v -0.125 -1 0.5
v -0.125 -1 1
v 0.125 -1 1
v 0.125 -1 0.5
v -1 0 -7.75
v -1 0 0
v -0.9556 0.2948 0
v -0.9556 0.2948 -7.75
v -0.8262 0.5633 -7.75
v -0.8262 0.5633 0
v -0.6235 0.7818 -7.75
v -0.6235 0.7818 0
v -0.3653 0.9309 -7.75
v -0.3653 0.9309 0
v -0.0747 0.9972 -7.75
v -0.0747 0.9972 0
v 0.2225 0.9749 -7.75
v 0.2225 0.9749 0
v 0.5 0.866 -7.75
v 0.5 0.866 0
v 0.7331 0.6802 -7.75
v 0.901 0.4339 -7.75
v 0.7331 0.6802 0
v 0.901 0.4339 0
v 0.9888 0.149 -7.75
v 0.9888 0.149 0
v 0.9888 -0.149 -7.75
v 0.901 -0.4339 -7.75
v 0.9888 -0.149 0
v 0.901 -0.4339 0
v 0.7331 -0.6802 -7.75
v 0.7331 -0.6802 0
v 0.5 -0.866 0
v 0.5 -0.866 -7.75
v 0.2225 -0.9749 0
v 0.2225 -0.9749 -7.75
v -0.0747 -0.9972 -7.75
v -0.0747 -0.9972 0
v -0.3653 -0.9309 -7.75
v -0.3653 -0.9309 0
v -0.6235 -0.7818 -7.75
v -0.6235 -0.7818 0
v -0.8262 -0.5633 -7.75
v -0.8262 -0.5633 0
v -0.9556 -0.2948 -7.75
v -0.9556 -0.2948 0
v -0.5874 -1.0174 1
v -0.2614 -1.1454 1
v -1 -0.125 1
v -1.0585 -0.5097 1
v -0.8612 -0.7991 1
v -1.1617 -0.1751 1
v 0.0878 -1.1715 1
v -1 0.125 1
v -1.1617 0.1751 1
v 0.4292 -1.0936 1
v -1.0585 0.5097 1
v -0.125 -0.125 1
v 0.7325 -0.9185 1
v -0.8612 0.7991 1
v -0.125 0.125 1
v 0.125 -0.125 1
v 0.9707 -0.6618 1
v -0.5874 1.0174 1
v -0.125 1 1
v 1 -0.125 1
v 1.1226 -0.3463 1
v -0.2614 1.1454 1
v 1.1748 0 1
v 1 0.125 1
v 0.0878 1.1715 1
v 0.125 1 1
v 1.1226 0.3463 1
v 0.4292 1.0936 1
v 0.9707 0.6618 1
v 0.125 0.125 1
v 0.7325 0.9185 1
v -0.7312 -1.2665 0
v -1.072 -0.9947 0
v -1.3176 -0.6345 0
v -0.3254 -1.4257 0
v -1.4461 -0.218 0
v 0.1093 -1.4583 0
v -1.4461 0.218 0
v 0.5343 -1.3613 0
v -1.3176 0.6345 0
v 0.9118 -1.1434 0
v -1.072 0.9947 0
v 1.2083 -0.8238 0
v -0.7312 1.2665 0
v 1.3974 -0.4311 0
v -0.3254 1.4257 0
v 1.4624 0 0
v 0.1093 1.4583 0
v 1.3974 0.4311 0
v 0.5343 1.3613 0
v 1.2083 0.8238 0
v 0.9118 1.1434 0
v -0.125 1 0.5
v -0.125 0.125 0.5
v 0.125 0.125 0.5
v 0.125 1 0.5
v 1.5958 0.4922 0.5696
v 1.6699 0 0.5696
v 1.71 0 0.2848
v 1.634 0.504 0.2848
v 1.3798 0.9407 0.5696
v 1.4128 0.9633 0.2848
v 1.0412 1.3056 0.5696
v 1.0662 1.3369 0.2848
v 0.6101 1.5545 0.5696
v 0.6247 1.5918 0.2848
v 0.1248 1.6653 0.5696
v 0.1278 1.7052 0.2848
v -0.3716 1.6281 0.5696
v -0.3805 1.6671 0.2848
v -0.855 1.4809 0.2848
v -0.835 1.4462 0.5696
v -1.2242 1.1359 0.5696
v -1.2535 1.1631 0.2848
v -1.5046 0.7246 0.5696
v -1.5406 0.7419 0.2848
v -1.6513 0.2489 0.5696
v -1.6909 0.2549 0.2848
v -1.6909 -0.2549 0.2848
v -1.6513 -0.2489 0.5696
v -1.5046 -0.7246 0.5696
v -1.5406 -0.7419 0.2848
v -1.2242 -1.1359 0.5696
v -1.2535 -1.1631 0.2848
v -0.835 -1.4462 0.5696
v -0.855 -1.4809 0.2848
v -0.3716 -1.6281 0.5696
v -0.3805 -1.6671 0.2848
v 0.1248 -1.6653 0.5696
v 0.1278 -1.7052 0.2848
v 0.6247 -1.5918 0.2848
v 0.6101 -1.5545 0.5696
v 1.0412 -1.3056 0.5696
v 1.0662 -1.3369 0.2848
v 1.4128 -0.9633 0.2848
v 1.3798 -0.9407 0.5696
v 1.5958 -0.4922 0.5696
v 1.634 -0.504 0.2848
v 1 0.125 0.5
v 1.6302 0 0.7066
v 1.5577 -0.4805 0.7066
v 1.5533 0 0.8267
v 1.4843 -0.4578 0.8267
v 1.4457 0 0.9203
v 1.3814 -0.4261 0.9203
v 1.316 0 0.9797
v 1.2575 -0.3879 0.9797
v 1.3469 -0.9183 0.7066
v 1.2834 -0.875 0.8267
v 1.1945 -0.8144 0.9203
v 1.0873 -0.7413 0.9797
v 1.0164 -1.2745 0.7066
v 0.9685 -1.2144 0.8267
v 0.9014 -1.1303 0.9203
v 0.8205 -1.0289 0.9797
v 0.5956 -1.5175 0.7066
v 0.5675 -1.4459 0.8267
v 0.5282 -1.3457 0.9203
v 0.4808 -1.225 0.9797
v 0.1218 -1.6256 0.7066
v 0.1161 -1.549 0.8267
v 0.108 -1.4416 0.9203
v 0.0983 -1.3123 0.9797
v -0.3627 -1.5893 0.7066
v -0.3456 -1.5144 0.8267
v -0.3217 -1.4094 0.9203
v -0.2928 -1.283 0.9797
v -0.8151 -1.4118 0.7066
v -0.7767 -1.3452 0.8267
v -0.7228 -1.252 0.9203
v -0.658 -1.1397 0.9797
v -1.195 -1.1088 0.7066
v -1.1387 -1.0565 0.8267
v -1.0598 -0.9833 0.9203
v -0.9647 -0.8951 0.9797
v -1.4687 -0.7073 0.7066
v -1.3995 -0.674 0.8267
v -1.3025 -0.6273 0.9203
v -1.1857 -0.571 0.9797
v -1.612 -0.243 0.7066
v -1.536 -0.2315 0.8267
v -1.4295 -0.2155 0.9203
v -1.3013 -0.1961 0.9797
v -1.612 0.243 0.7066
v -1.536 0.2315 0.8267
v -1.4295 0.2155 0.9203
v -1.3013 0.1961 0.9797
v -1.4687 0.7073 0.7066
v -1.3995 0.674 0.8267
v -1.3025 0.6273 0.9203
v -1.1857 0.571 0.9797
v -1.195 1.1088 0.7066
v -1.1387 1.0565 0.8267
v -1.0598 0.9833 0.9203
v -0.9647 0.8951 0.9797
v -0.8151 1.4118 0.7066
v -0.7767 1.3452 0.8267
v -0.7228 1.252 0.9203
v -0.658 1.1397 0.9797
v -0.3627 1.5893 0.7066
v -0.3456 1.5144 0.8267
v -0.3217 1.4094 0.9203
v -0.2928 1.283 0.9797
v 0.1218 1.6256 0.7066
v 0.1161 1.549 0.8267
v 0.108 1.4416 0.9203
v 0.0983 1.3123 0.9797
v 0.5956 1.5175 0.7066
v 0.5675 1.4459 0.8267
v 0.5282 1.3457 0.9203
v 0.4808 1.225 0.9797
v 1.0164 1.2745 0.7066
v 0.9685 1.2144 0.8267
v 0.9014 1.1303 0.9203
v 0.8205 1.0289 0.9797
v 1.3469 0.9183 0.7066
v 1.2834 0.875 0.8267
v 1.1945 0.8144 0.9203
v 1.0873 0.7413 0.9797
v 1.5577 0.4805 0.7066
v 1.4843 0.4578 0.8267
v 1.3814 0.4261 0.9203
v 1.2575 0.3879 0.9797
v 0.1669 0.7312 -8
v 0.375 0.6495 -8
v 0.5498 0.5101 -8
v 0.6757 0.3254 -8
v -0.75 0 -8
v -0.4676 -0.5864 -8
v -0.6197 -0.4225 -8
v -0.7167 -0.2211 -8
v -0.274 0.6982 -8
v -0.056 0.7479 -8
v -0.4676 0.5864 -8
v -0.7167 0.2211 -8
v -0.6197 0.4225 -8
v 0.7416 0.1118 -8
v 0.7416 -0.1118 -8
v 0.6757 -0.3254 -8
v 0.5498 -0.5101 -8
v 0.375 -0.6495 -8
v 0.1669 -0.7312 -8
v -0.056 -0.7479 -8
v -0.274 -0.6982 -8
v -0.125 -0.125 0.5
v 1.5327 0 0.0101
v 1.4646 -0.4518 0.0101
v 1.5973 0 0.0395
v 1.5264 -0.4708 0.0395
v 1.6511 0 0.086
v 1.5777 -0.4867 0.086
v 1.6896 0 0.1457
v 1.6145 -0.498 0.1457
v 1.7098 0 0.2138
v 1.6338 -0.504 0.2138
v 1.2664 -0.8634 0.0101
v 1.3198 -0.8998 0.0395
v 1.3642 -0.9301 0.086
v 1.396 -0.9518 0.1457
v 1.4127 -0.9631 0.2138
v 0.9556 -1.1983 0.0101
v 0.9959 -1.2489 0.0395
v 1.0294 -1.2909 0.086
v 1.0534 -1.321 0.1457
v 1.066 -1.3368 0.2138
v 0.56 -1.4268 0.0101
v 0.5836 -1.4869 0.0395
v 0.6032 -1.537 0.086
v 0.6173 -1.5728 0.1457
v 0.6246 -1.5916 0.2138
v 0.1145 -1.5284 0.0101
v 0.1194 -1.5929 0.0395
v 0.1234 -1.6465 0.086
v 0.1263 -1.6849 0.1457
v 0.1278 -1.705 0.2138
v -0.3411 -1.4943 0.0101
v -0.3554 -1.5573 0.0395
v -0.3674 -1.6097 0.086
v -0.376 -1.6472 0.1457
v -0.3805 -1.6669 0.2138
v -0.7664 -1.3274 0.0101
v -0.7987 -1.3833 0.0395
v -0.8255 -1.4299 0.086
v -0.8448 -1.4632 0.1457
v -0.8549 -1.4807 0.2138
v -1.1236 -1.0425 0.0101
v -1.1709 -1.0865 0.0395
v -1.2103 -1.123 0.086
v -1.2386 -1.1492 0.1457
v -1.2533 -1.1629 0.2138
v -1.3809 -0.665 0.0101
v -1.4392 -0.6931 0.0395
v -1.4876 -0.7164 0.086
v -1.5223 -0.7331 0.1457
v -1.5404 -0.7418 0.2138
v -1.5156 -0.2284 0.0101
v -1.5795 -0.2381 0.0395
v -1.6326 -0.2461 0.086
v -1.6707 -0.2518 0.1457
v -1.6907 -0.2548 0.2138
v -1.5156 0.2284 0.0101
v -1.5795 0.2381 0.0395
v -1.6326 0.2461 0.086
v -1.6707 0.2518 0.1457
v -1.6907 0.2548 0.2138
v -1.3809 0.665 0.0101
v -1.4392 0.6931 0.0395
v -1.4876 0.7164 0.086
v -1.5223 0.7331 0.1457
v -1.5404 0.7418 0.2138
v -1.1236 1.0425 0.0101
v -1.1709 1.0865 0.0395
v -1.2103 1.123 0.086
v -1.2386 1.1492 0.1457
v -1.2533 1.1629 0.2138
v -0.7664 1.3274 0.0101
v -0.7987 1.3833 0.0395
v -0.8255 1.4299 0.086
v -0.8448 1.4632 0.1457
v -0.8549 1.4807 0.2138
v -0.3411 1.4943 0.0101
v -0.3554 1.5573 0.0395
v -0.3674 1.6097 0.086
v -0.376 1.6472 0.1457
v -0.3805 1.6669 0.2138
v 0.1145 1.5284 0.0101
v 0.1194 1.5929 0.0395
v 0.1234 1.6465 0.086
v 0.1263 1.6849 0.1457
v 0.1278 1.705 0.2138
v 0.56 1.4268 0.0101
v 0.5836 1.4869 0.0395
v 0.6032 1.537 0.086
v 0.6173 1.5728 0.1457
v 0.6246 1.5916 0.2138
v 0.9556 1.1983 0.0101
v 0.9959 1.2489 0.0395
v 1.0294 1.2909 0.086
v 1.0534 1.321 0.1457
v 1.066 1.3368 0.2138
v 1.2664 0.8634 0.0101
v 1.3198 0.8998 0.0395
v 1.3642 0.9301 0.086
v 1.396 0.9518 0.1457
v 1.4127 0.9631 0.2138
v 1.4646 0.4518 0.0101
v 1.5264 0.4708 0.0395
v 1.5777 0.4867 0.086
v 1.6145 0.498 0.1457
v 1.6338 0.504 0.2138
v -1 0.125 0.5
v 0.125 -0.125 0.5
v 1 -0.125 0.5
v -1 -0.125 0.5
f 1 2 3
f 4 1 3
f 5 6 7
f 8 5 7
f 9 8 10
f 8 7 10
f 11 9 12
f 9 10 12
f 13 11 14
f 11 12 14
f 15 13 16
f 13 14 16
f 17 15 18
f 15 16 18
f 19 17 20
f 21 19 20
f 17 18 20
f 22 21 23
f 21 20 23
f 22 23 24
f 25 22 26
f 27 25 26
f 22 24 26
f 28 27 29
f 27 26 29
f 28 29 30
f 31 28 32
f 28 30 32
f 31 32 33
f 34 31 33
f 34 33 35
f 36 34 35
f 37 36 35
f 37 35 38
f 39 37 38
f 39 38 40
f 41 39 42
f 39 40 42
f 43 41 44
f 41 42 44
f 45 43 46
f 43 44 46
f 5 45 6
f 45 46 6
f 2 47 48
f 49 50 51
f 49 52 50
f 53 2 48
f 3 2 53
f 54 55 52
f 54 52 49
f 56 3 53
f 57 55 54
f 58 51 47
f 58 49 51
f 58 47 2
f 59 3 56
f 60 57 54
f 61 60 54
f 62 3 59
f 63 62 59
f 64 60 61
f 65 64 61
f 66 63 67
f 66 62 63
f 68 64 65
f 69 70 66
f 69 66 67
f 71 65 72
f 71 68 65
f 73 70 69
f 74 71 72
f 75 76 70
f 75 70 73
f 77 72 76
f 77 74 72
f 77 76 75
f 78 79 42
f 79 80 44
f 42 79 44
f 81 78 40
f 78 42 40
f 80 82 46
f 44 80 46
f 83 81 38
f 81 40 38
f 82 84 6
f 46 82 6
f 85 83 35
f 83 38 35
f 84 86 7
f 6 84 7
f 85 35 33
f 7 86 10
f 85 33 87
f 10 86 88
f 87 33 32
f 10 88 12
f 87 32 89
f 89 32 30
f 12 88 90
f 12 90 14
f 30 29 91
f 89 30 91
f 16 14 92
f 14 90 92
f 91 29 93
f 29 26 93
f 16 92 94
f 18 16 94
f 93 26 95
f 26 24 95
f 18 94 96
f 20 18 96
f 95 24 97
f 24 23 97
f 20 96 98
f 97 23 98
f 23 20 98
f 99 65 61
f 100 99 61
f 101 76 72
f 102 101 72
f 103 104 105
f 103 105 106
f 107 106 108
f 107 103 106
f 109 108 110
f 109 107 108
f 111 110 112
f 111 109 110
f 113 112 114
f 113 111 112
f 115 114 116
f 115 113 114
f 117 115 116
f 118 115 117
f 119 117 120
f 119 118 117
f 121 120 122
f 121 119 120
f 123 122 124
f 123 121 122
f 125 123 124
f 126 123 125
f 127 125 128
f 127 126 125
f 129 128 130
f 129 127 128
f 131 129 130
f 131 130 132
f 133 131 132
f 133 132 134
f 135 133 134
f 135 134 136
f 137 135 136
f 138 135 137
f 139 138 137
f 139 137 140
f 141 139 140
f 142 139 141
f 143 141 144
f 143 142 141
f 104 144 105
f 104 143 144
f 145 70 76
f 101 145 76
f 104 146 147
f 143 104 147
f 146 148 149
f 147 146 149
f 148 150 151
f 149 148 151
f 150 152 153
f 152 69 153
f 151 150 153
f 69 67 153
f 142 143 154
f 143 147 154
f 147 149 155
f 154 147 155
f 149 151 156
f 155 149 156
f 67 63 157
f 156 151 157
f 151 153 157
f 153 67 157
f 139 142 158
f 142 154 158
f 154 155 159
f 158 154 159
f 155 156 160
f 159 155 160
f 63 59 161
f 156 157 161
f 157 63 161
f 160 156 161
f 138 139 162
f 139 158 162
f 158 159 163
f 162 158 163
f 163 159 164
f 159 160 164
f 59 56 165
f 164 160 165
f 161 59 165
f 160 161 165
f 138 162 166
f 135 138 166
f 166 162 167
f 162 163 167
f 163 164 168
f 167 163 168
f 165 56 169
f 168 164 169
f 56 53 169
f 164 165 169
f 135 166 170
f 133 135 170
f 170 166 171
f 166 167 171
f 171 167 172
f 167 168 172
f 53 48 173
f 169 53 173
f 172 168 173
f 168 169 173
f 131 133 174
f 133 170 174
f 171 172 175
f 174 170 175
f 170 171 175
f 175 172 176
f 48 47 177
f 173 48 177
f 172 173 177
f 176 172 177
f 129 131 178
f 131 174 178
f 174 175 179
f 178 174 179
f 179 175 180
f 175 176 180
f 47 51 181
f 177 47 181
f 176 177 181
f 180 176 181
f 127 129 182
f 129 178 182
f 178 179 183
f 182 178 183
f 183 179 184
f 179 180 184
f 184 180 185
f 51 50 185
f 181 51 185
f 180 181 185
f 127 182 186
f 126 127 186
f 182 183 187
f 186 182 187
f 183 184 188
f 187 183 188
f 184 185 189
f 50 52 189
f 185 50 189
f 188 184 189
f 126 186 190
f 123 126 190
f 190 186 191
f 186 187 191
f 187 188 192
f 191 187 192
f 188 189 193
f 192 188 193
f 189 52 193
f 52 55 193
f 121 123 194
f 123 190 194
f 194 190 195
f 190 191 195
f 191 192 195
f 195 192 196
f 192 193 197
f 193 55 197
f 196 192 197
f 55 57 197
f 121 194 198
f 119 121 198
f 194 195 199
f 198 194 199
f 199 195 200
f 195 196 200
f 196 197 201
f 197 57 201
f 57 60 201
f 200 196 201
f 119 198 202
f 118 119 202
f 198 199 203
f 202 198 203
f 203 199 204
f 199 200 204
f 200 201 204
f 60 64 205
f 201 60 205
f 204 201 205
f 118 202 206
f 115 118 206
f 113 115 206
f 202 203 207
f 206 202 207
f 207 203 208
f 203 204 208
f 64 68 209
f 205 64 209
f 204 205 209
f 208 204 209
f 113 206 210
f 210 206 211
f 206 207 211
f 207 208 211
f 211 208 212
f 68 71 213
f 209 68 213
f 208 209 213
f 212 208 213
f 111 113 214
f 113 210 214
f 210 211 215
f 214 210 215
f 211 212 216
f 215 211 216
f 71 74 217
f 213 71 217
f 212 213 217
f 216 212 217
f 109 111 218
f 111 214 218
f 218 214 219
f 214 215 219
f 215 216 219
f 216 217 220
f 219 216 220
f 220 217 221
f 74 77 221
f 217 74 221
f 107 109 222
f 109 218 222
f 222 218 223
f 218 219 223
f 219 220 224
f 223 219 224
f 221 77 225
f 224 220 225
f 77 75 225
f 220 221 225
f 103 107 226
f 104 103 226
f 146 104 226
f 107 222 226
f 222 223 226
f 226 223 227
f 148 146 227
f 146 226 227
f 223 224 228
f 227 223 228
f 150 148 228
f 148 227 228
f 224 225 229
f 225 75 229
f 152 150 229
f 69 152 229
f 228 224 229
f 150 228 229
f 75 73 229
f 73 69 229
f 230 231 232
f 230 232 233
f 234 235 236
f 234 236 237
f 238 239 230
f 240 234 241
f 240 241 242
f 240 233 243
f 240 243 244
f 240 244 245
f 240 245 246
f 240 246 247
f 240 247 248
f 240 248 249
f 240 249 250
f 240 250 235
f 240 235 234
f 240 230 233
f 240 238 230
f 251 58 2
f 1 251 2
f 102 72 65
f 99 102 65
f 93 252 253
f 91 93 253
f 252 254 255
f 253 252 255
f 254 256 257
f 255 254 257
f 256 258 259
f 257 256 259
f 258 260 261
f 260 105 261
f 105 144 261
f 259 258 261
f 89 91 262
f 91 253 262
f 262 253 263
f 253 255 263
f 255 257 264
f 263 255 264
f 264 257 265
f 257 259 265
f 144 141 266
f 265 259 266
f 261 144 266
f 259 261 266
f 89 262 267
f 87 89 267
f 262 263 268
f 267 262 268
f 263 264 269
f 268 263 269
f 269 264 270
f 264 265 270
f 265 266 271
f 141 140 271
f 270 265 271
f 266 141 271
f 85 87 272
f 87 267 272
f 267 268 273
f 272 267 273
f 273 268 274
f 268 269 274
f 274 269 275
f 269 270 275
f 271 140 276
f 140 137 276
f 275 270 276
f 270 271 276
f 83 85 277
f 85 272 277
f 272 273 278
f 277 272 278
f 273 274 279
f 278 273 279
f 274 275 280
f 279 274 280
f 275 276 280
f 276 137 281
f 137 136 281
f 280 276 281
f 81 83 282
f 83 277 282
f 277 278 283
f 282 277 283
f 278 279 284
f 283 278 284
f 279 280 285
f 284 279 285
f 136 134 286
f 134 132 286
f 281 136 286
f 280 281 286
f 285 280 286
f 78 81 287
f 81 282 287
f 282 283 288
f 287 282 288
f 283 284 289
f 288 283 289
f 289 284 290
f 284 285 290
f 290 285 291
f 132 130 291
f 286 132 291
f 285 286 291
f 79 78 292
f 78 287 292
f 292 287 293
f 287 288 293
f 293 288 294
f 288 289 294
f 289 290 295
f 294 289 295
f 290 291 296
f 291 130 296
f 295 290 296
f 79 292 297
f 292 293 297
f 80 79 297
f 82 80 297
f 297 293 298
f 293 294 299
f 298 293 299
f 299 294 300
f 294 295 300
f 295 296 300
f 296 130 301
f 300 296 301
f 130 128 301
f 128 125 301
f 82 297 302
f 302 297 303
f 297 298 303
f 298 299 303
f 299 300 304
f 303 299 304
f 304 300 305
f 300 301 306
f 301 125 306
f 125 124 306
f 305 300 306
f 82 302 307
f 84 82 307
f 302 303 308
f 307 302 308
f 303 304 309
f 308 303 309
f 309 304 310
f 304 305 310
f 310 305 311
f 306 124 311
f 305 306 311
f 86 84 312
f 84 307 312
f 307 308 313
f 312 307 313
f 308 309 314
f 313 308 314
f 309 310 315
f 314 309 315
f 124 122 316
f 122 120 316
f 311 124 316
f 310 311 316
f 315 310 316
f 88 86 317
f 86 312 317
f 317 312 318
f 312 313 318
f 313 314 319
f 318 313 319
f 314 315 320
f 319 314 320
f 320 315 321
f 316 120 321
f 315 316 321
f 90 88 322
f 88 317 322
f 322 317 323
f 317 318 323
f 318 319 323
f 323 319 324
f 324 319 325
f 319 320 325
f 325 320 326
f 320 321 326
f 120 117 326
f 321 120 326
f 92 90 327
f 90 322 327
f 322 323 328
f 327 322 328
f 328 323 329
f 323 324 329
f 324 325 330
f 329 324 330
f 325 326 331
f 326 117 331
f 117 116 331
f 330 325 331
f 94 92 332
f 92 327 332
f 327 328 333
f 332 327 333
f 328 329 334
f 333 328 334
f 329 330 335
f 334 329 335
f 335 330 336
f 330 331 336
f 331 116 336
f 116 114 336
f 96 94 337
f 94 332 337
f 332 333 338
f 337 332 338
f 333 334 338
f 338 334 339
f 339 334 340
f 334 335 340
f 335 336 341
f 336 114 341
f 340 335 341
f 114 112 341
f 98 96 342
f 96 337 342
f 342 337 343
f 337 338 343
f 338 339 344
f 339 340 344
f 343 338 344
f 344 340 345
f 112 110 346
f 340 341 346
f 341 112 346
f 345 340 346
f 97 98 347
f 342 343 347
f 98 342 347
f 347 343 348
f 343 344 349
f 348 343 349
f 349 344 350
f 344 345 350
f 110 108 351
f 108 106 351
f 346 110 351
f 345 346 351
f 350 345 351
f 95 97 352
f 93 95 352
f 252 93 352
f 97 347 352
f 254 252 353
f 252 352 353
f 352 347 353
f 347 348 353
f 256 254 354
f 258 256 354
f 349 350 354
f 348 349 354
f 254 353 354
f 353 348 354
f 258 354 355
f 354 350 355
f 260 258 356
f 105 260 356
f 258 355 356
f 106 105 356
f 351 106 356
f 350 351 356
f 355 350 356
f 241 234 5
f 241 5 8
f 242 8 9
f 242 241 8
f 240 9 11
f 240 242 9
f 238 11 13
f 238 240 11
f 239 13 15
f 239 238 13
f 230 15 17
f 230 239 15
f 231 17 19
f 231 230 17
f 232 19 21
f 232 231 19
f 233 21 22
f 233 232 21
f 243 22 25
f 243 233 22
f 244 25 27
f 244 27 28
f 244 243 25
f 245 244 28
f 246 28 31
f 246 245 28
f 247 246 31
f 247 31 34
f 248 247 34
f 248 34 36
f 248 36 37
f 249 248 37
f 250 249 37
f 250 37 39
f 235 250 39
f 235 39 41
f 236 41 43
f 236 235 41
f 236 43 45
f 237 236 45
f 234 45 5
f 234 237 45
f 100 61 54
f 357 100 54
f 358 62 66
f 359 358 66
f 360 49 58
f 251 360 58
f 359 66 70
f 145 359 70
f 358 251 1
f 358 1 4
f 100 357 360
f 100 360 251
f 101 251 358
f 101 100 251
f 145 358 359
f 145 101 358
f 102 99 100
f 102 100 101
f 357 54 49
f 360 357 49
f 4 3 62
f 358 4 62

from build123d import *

# Parameters (mm, degrees)
ESQUISSE1_R             = 1.75
BASE_EXTRUSION_DEPTH    = 1
BASE_EXTRUSION_TAPER    = 8
CONG_1_R                = 0.5
ESQUISSE2_R             = 1
BOSS_EXTRU_1_DEPTH      = 8
CHANFREIN1_SIZE         = 0.25
ENL_V_MAT_EXTRU_1_DEPTH = 0.5
CONG_2_R                = 0.25


with BuildPart() as part:
    # Esquisse1 → Base-Extrusion (new body)
    with BuildSketch(Plane.XY):
        Circle(ESQUISSE1_R)
    extrude(amount=BASE_EXTRUSION_DEPTH, taper=BASE_EXTRUSION_TAPER)

    # Congé1
    cong_1_edges = [part.edges().sort_by_distance(p)[0] for p in [
        (-1.609459165, 0, 1),
    ]]
    fillet(cong_1_edges, radius=CONG_1_R)

    # Esquisse2 → Boss.-Extru.1 (add)
    with BuildSketch(Plane(origin=(0, 0, 0), x_dir=(-1, 0, 0), z_dir=(0, 0, -1))):
        Circle(ESQUISSE2_R)
    extrude(amount=BOSS_EXTRU_1_DEPTH)

    # Chanfrein1
    chanfrein1_edges = [part.edges().sort_by_distance(p)[0] for p in [
        (1, 0, -8),
    ]]
    chamfer(chanfrein1_edges, length=CHANFREIN1_SIZE)

    # Esquisse3 → Enlèv. mat.-Extru.1 (cut)
    with BuildSketch(Plane.XY.offset(1)):
        Polygon((-0.125, 1), (-0.125, 0.125), (-1, 0.125), (-1, -0.125), (-0.125, -0.125), (-0.125, -1), (0.125, -1), (0.125, -0.125), (1, -0.125), (1, 0.125), (0.125, 0.125), (0.125, 1), align=None)
    extrude(amount=-ENL_V_MAT_EXTRU_1_DEPTH, mode=Mode.SUBTRACT)

    # Congé2
    cong_2_edges = [part.edges().sort_by_distance(p)[0] for p in [
        (-1.75, 0, 0),
    ]]
    fillet(cong_2_edges, radius=CONG_2_R)


solid = part.part
